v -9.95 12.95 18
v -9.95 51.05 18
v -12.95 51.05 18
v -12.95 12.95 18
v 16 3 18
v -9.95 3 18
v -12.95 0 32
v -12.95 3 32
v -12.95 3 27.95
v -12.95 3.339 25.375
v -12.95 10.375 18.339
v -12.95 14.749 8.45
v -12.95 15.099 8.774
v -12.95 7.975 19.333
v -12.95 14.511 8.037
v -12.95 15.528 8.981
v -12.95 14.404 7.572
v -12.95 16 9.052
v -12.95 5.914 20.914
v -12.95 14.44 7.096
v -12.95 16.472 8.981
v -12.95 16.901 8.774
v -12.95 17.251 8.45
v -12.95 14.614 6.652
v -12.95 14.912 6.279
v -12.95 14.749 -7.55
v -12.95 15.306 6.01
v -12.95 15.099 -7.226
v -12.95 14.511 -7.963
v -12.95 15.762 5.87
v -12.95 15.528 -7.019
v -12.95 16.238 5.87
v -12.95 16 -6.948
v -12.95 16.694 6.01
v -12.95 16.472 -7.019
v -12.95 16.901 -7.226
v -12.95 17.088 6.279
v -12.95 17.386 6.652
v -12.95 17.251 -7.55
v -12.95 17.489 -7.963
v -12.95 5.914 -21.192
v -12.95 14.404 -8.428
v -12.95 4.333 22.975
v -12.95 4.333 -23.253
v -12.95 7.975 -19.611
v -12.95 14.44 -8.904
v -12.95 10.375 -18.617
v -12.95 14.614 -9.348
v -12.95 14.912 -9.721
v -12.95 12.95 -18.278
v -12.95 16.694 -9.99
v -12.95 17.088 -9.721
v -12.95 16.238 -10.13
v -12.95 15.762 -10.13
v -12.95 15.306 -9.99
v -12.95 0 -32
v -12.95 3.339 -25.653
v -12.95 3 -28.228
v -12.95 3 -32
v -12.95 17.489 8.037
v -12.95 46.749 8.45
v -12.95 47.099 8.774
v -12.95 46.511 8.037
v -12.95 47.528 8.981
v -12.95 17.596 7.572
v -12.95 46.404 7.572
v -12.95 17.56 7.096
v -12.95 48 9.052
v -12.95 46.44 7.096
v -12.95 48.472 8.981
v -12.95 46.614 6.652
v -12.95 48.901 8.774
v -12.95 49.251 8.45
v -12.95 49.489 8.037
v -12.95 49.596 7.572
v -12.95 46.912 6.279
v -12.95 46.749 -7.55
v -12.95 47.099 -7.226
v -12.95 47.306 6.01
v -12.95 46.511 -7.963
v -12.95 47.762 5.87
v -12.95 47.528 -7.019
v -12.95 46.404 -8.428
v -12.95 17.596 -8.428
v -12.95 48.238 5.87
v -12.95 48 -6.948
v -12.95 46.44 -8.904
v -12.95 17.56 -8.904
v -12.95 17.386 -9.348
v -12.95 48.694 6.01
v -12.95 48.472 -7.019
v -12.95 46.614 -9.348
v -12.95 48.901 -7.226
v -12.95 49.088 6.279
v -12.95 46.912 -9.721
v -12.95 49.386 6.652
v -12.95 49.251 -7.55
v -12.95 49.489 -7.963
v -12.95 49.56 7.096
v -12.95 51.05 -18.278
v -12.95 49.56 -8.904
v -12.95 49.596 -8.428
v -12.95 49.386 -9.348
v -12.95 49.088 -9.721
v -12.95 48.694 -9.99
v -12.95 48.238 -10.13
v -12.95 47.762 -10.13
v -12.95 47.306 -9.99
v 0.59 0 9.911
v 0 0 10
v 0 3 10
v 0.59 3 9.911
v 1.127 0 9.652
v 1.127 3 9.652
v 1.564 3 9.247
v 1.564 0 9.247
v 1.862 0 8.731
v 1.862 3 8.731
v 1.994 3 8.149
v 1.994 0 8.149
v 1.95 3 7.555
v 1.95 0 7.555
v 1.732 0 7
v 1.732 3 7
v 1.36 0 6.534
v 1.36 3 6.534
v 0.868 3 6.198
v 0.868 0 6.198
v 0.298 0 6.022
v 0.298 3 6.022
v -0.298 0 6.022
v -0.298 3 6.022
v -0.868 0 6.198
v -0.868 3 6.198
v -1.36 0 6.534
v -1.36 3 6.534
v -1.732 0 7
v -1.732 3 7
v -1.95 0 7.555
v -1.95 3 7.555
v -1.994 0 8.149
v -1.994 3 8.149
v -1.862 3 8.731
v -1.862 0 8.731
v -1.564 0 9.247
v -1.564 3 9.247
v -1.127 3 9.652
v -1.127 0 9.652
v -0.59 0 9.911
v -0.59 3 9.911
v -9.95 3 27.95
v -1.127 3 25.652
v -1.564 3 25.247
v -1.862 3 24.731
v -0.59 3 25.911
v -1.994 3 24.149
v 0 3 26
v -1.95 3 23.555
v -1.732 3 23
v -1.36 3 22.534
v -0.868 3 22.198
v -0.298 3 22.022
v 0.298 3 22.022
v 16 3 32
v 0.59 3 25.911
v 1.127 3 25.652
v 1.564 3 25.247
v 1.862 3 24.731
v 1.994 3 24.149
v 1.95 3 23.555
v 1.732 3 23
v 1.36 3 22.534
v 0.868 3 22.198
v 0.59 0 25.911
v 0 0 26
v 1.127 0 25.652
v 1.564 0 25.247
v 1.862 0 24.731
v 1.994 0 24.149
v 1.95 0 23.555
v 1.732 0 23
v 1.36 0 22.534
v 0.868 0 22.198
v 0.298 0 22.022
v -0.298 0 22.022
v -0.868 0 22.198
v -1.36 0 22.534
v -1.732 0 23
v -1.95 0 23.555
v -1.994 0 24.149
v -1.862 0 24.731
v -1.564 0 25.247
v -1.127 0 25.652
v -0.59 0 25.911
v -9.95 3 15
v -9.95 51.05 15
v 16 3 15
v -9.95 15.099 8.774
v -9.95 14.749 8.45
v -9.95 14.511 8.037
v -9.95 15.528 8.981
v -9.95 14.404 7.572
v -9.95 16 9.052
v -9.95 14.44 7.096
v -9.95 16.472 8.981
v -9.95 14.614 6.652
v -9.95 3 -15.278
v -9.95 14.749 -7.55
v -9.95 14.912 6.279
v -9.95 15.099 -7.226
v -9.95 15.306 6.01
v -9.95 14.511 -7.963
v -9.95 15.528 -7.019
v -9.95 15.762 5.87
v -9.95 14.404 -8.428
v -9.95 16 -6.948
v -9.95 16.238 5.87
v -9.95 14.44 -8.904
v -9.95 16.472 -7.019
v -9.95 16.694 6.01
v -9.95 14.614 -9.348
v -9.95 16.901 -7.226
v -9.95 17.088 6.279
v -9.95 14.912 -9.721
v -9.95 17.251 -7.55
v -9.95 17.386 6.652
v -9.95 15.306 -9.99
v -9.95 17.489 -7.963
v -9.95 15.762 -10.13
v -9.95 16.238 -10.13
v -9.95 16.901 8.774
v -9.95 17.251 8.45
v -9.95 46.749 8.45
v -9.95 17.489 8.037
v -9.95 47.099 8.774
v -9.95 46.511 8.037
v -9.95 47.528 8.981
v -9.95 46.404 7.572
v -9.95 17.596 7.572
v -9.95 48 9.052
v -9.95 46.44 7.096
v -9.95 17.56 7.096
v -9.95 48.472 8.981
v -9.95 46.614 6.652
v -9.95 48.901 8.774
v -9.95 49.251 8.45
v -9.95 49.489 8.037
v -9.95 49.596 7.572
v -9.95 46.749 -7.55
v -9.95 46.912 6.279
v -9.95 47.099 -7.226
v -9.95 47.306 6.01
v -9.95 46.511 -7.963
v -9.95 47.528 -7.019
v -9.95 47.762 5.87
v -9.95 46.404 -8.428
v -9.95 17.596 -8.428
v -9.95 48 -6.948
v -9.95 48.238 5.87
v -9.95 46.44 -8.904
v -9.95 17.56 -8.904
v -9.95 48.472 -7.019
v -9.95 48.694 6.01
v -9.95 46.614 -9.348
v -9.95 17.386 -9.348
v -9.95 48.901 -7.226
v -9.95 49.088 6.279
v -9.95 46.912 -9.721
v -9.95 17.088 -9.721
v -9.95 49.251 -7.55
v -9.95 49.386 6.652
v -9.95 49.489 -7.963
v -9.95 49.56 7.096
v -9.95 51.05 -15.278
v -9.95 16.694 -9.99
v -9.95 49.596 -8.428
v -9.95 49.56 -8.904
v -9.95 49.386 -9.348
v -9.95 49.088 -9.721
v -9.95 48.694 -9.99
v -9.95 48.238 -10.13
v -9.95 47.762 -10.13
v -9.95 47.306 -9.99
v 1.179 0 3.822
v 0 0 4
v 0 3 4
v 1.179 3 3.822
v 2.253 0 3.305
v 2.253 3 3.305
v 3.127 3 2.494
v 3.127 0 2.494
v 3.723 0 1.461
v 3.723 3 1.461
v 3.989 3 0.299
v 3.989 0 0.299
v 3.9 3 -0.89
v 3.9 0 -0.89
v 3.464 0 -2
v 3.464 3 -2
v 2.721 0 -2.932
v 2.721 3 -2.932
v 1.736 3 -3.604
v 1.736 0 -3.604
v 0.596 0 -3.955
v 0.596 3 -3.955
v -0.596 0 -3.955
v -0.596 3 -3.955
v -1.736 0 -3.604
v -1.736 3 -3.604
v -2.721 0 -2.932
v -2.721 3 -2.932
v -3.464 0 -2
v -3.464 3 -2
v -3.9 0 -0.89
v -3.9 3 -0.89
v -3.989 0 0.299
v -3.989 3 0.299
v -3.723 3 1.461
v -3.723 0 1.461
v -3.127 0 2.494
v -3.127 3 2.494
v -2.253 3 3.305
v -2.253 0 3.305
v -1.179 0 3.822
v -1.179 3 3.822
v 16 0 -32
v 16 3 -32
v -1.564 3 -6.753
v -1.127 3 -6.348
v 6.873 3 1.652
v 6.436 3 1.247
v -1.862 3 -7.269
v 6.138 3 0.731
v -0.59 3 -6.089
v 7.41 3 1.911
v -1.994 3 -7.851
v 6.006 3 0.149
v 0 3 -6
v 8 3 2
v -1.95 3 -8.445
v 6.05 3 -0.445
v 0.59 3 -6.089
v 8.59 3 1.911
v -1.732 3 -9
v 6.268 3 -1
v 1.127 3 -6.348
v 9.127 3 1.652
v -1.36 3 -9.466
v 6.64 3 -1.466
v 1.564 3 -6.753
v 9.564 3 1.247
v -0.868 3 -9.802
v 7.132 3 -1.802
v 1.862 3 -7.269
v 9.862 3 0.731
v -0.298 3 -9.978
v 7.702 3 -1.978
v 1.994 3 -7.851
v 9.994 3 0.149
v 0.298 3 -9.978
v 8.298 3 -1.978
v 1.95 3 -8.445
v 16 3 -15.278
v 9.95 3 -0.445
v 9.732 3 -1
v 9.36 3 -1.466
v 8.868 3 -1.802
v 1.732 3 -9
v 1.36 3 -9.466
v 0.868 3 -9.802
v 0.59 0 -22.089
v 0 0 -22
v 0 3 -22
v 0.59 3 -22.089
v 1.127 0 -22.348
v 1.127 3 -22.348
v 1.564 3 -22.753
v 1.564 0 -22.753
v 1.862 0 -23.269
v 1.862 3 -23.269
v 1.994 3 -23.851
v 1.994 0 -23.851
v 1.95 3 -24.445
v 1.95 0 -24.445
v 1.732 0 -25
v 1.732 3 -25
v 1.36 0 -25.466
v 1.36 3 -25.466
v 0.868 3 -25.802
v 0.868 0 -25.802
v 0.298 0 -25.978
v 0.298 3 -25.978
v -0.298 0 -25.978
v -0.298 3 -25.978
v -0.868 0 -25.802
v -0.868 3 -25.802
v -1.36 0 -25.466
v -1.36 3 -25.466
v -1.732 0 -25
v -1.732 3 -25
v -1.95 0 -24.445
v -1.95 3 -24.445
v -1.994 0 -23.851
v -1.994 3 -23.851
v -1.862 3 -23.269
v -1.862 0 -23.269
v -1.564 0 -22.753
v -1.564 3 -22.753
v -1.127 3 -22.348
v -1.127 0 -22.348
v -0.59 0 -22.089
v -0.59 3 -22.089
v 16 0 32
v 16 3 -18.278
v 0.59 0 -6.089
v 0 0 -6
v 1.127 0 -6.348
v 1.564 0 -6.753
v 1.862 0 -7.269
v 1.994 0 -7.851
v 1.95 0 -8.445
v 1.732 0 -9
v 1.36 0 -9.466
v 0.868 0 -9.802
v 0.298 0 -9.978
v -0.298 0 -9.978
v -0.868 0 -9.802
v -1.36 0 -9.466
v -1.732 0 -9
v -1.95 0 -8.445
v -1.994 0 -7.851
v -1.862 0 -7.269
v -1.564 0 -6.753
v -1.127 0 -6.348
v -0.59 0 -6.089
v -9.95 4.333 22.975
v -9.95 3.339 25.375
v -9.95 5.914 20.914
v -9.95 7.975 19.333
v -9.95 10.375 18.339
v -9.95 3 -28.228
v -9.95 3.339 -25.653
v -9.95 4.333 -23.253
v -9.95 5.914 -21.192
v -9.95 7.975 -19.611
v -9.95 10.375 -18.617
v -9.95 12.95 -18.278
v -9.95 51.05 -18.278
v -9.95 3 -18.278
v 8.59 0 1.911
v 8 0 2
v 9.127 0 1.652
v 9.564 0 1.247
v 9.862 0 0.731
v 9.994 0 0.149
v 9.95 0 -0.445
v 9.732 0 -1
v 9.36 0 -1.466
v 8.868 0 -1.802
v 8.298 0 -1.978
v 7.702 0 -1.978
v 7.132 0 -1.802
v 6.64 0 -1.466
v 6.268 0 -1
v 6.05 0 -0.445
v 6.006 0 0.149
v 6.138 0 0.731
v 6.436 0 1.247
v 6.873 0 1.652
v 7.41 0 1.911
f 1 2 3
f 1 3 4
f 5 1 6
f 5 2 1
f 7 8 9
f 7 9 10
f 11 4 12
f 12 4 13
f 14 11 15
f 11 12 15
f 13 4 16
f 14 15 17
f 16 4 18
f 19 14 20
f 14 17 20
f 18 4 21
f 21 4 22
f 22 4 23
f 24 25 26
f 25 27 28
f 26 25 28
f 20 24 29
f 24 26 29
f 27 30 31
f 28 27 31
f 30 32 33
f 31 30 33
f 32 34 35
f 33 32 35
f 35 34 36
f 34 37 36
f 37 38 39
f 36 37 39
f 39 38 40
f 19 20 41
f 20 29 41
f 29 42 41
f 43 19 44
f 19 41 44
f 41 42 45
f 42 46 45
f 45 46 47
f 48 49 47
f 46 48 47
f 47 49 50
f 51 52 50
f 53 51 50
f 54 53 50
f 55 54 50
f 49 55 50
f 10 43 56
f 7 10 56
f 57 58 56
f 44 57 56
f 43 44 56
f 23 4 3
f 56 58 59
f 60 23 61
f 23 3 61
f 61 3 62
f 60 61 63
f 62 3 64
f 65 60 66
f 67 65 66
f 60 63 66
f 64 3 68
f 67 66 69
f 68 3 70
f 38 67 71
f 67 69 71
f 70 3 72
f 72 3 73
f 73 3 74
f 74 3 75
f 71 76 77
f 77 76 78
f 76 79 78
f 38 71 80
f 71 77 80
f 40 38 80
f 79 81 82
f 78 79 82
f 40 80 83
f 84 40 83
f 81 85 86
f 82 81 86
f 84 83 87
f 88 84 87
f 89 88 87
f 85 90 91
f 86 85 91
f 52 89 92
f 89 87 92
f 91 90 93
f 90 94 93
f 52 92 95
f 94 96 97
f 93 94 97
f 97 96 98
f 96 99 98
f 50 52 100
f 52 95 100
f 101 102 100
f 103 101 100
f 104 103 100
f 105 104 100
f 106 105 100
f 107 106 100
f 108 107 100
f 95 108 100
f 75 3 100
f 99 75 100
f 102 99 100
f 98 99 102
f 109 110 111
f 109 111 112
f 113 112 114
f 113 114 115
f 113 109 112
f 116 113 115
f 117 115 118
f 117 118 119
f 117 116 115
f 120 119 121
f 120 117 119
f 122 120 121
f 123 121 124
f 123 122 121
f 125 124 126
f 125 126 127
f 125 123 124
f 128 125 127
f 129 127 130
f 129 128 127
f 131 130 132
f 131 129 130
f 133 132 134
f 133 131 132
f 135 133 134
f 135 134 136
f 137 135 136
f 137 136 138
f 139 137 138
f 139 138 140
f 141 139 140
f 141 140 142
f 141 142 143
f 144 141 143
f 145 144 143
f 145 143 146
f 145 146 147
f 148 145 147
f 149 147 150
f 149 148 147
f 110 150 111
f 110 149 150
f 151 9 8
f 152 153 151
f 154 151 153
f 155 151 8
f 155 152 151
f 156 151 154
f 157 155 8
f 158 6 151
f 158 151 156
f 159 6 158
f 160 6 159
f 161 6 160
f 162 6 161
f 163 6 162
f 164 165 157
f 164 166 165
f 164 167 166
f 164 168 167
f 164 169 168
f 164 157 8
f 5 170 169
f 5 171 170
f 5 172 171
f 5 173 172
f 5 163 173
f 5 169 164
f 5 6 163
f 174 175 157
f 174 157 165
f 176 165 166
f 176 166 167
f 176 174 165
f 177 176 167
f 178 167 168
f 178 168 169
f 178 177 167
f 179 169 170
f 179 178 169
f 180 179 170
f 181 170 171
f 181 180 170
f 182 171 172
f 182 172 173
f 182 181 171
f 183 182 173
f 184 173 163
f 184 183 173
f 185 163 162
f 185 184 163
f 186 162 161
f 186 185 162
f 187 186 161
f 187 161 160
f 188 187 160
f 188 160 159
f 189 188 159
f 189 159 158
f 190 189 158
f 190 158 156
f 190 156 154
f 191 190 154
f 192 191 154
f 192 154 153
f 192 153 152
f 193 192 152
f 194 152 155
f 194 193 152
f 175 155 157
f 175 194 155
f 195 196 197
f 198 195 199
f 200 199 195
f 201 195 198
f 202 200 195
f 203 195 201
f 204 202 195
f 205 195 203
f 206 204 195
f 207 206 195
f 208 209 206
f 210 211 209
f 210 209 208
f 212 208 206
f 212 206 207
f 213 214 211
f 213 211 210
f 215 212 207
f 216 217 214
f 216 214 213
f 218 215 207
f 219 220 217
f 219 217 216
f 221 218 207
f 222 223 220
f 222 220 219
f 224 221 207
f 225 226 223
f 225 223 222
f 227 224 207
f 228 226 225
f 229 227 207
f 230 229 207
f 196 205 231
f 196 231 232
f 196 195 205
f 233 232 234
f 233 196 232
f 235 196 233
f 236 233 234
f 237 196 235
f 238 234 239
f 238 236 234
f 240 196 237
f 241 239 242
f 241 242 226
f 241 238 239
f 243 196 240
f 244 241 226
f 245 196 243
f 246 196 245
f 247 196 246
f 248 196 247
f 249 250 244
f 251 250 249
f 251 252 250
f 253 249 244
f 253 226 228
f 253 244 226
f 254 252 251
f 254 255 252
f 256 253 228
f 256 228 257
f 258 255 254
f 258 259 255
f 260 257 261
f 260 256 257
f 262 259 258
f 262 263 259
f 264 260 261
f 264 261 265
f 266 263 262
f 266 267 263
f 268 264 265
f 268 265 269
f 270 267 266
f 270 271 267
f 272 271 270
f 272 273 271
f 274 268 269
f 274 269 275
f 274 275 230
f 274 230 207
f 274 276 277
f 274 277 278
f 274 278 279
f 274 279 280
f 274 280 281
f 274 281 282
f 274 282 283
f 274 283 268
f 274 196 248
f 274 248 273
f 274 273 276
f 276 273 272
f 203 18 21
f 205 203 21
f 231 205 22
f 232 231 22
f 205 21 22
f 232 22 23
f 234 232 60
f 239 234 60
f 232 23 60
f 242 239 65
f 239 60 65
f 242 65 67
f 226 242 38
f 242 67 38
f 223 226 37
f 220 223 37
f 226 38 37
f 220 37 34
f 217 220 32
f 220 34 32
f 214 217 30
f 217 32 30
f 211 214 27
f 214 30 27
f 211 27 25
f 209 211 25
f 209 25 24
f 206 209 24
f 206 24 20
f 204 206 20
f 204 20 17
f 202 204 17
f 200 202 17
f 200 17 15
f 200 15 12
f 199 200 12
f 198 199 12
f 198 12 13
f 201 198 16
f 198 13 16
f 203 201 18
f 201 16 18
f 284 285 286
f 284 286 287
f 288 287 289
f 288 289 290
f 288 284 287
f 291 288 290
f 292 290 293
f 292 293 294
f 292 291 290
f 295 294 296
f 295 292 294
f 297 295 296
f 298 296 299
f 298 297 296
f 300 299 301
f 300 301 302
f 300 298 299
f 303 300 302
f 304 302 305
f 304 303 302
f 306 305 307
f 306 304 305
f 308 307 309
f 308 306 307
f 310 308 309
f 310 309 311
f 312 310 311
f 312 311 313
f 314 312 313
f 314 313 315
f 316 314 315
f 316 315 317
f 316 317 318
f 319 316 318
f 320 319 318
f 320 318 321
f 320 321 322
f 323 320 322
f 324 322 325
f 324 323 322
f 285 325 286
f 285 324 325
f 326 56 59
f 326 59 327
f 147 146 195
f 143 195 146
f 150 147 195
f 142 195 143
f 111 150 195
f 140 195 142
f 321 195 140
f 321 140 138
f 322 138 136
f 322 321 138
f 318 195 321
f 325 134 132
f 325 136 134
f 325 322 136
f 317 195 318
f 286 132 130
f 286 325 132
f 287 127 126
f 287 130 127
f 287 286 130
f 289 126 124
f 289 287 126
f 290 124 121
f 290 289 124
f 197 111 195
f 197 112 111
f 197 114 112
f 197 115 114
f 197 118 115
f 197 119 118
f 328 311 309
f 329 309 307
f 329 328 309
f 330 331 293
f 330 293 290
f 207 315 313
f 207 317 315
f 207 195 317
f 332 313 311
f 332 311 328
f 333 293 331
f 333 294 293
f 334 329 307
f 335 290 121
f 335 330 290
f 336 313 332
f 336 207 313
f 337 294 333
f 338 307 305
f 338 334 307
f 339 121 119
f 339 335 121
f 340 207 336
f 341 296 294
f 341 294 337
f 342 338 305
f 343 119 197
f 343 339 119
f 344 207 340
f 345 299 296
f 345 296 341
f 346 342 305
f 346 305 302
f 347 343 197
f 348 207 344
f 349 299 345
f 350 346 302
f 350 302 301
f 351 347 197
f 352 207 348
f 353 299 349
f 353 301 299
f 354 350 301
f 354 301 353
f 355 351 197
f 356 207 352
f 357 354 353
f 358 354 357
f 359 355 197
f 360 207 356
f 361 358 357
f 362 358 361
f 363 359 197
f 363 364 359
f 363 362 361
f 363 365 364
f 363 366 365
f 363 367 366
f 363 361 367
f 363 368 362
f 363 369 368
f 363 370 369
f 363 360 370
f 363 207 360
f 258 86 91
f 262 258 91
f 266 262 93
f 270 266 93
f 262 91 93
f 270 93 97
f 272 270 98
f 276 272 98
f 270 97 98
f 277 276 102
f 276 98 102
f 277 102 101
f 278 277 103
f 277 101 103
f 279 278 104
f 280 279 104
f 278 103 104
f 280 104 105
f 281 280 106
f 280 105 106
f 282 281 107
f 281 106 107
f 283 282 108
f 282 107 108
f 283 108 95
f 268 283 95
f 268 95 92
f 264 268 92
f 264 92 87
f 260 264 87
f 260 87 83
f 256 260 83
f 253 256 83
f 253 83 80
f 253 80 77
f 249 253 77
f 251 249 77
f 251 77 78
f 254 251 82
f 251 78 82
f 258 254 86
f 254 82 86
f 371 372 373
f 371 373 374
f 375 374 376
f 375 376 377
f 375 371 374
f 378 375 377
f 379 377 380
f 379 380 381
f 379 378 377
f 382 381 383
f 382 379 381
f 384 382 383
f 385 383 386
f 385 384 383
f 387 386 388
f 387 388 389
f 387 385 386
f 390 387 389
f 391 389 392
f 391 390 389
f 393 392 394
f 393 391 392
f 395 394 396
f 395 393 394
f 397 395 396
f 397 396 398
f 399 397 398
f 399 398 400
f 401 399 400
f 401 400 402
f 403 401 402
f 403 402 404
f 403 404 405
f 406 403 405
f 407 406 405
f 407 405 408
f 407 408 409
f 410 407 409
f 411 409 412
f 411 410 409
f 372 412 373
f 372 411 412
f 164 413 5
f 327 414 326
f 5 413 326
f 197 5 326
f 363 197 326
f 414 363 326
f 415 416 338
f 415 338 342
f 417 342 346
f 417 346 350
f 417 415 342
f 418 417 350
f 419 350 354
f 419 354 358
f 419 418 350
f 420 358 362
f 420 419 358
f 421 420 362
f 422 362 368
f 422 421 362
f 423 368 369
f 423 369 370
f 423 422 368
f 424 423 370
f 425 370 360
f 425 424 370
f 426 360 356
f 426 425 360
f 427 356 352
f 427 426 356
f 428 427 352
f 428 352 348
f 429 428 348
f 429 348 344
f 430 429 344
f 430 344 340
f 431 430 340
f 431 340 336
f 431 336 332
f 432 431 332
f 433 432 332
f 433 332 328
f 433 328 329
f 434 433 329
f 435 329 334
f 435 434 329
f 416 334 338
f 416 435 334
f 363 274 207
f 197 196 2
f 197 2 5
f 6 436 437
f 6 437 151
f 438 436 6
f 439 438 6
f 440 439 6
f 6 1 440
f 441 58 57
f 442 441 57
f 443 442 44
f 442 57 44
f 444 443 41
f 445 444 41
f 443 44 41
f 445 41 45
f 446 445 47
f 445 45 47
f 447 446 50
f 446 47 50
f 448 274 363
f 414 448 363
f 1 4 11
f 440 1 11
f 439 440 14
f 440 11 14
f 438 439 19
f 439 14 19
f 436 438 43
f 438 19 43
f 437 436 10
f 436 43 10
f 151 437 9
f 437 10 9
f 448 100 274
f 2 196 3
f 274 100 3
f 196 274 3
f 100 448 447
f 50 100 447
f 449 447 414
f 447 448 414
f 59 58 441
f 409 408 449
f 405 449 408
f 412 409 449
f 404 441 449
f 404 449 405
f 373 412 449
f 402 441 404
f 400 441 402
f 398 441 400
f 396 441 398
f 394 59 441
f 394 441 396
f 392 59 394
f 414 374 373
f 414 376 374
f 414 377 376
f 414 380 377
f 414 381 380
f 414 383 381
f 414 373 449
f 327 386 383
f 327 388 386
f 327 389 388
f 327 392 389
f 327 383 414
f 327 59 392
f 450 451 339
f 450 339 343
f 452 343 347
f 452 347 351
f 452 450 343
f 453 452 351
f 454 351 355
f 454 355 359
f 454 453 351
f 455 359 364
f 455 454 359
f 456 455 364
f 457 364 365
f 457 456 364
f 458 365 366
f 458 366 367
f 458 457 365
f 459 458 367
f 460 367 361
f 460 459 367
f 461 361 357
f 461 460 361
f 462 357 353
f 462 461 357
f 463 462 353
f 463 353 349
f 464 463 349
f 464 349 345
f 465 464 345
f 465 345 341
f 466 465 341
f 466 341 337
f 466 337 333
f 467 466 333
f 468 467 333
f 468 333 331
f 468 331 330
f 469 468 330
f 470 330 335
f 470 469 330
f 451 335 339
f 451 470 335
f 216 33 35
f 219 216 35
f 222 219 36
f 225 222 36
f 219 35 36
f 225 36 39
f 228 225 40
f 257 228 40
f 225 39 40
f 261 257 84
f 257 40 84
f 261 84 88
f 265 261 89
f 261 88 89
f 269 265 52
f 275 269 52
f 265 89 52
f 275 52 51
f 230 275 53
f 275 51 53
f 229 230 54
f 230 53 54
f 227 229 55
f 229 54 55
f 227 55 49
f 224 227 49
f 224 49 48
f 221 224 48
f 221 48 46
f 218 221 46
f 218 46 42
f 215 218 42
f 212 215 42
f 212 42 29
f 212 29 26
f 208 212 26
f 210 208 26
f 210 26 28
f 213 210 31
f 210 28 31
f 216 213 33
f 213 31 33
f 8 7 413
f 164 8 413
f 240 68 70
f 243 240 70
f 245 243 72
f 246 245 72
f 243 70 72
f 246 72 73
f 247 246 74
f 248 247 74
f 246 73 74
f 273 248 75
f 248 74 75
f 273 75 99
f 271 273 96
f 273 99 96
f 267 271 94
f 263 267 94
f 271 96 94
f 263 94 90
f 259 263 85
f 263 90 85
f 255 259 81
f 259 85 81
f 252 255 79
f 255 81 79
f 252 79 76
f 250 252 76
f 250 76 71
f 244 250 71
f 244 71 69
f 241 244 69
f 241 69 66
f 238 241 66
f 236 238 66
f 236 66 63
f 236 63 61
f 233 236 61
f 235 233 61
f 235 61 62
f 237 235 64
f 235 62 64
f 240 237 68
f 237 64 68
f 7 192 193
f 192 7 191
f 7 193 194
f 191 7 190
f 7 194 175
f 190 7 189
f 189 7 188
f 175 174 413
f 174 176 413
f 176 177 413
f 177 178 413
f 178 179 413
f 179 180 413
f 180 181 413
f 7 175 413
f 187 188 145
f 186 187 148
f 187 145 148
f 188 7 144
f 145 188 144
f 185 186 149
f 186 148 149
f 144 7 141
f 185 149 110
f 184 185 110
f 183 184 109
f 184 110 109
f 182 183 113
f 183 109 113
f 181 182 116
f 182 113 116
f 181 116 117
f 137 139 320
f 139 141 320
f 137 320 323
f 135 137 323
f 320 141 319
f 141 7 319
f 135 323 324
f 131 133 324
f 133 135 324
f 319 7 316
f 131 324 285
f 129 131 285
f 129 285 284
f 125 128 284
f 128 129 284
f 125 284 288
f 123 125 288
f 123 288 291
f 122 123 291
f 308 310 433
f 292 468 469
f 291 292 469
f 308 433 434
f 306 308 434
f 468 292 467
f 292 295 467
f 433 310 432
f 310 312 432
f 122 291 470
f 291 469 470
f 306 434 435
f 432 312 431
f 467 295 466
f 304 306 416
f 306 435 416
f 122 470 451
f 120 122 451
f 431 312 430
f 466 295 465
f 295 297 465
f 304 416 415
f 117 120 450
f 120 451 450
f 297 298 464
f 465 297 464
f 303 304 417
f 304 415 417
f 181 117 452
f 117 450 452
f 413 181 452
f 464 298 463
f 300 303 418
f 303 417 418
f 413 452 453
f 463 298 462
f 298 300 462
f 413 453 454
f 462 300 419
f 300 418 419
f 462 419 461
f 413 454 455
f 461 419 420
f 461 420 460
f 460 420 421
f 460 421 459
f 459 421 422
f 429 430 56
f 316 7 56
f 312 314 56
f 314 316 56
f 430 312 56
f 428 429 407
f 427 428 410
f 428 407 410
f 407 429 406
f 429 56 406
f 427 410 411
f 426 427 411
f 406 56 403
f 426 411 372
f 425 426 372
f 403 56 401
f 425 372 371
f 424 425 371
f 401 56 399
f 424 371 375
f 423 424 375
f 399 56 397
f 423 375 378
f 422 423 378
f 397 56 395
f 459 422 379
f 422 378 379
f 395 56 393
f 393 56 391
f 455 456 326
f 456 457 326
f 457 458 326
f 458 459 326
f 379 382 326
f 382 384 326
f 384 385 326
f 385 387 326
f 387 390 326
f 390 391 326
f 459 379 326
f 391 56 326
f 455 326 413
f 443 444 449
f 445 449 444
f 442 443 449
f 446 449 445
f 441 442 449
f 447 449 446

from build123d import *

# Parameters (mm, degrees)
SKETCH1_W           = 28.95
SKETCH1_H           = 64
SKETCH1_R           = 2
SKETCH1_R_2         = 4
BOSS_EXTRUDE1_DEPTH = 3
SKETCH2_R           = 1.6
BOSS_EXTRUDE2_DEPTH = 3
RIB1_REACH          = 75.226
SKETCH3_WALL_W      = 203.062325646
SKETCH3_WALL_H      = 3
RIB2_REACH          = 75.416
SKETCH4_WALL_W      = 203.442532142
SKETCH4_WALL_H      = 3


with BuildPart() as part:
    # Sketch1 → Boss-Extrude1 (new body)
    with BuildSketch(Plane(origin=(0, 0, 0), x_dir=(1, 0, 0), z_dir=(0, 1, 0))):
        with Locations((1.525, 0)):
            Rectangle(SKETCH1_W, SKETCH1_H)
        with Locations(Location((0, -24, 0), (0, 0, 270))):
            Circle(SKETCH1_R, mode=Mode.SUBTRACT)
        with Locations(Location((0, 24, 0), (0, 0, 270))):
            Circle(SKETCH1_R, mode=Mode.SUBTRACT)
        with Locations((0, 16)):
            Circle(SKETCH1_R_2, mode=Mode.SUBTRACT)
        with Locations(Location((0, -8, 0), (0, 0, 270))):
            Circle(SKETCH1_R, mode=Mode.SUBTRACT)
        with Locations(Location((8, 0, 0), (0, 0, 270))):
            Circle(SKETCH1_R, mode=Mode.SUBTRACT)
        with Locations(Location((0, 8, 0), (0, 0, 270))):
            Circle(SKETCH1_R, mode=Mode.SUBTRACT)
        with Locations(Location((0, 0, 0), (0, 0, 270))):
            Circle(SKETCH1_R_2, mode=Mode.SUBTRACT)
        with Locations((0, -16)):
            Circle(SKETCH1_R_2, mode=Mode.SUBTRACT)
        with Locations((0, -16)):
            Circle(SKETCH1_R_2)
        with Locations((0, 16)):
            Circle(SKETCH1_R_2)
    extrude(amount=BOSS_EXTRUDE1_DEPTH)

    # Sketch2 → Boss-Extrude2 (add)
    with BuildSketch(Plane.ZY.offset(12.95)):
        with BuildLine():
            Line((18, 51.05), (18, 12.95))
            ThreePointArc((18, 12.95), (20.914287527, 5.914287527), (27.95, 3))
            Line((27.95, 3), (32, 3))
            Line((32, 3), (32, 0))
            Line((32, 0), (-32, 0))
            Line((-32, 0), (-32, 3))
            Line((-32, 3), (-28.228, 3))
            ThreePointArc((-28.228, 3), (-21.192287527, 5.914287527), (-18.278, 12.95))
            Line((-18.278, 12.95), (-18.278, 51.05))
            Line((-18.278, 51.05), (18, 51.05))
        make_face()
        with Locations((-8.548, 48)):
            Circle(SKETCH2_R, mode=Mode.SUBTRACT)
        with Locations((-8.548, 16)):
            Circle(SKETCH2_R, mode=Mode.SUBTRACT)
        with Locations((7.452, 16)):
            Circle(SKETCH2_R, mode=Mode.SUBTRACT)
        with Locations((7.452, 48)):
            Circle(SKETCH2_R, mode=Mode.SUBTRACT)
    extrude(amount=-BOSS_EXTRUDE2_DEPTH)

    # Sketch3 wall → Rib1 (add, up to next)
    with BuildSketch(Plane(origin=(3.025, 27.025, 18), x_dir=(0.475191447028, -0.879882428891, 0), z_dir=(0.879882428891, 0.475191447028, 0)), mode=Mode.PRIVATE) as rib1_sk1:
        with Locations((0, 1.5)):
            Rectangle(SKETCH3_WALL_W, SKETCH3_WALL_H)
    rib1_tool1 = extrude(rib1_sk1.sketch, amount=-RIB1_REACH, mode=Mode.PRIVATE) - part.part
    add(rib1_tool1.solids().sort_by_distance((3.025, 27.025, 18))[0])

    # Sketch4 wall → Rib2 (add, up to next)
    with BuildSketch(Plane(origin=(3.025, 27.025, -18.278), x_dir=(0.475191447028, -0.879882428891, 0), z_dir=(-0.879882428891, -0.475191447028, 0)), mode=Mode.PRIVATE) as rib2_sk1:
        with Locations((0, 1.5)):
            Rectangle(SKETCH4_WALL_W, SKETCH4_WALL_H)
    rib2_tool1 = extrude(rib2_sk1.sketch, amount=RIB2_REACH, mode=Mode.PRIVATE) - part.part
    add(rib2_tool1.solids().sort_by_distance((3.025, 27.025, -18.278))[0])


solid = part.part
